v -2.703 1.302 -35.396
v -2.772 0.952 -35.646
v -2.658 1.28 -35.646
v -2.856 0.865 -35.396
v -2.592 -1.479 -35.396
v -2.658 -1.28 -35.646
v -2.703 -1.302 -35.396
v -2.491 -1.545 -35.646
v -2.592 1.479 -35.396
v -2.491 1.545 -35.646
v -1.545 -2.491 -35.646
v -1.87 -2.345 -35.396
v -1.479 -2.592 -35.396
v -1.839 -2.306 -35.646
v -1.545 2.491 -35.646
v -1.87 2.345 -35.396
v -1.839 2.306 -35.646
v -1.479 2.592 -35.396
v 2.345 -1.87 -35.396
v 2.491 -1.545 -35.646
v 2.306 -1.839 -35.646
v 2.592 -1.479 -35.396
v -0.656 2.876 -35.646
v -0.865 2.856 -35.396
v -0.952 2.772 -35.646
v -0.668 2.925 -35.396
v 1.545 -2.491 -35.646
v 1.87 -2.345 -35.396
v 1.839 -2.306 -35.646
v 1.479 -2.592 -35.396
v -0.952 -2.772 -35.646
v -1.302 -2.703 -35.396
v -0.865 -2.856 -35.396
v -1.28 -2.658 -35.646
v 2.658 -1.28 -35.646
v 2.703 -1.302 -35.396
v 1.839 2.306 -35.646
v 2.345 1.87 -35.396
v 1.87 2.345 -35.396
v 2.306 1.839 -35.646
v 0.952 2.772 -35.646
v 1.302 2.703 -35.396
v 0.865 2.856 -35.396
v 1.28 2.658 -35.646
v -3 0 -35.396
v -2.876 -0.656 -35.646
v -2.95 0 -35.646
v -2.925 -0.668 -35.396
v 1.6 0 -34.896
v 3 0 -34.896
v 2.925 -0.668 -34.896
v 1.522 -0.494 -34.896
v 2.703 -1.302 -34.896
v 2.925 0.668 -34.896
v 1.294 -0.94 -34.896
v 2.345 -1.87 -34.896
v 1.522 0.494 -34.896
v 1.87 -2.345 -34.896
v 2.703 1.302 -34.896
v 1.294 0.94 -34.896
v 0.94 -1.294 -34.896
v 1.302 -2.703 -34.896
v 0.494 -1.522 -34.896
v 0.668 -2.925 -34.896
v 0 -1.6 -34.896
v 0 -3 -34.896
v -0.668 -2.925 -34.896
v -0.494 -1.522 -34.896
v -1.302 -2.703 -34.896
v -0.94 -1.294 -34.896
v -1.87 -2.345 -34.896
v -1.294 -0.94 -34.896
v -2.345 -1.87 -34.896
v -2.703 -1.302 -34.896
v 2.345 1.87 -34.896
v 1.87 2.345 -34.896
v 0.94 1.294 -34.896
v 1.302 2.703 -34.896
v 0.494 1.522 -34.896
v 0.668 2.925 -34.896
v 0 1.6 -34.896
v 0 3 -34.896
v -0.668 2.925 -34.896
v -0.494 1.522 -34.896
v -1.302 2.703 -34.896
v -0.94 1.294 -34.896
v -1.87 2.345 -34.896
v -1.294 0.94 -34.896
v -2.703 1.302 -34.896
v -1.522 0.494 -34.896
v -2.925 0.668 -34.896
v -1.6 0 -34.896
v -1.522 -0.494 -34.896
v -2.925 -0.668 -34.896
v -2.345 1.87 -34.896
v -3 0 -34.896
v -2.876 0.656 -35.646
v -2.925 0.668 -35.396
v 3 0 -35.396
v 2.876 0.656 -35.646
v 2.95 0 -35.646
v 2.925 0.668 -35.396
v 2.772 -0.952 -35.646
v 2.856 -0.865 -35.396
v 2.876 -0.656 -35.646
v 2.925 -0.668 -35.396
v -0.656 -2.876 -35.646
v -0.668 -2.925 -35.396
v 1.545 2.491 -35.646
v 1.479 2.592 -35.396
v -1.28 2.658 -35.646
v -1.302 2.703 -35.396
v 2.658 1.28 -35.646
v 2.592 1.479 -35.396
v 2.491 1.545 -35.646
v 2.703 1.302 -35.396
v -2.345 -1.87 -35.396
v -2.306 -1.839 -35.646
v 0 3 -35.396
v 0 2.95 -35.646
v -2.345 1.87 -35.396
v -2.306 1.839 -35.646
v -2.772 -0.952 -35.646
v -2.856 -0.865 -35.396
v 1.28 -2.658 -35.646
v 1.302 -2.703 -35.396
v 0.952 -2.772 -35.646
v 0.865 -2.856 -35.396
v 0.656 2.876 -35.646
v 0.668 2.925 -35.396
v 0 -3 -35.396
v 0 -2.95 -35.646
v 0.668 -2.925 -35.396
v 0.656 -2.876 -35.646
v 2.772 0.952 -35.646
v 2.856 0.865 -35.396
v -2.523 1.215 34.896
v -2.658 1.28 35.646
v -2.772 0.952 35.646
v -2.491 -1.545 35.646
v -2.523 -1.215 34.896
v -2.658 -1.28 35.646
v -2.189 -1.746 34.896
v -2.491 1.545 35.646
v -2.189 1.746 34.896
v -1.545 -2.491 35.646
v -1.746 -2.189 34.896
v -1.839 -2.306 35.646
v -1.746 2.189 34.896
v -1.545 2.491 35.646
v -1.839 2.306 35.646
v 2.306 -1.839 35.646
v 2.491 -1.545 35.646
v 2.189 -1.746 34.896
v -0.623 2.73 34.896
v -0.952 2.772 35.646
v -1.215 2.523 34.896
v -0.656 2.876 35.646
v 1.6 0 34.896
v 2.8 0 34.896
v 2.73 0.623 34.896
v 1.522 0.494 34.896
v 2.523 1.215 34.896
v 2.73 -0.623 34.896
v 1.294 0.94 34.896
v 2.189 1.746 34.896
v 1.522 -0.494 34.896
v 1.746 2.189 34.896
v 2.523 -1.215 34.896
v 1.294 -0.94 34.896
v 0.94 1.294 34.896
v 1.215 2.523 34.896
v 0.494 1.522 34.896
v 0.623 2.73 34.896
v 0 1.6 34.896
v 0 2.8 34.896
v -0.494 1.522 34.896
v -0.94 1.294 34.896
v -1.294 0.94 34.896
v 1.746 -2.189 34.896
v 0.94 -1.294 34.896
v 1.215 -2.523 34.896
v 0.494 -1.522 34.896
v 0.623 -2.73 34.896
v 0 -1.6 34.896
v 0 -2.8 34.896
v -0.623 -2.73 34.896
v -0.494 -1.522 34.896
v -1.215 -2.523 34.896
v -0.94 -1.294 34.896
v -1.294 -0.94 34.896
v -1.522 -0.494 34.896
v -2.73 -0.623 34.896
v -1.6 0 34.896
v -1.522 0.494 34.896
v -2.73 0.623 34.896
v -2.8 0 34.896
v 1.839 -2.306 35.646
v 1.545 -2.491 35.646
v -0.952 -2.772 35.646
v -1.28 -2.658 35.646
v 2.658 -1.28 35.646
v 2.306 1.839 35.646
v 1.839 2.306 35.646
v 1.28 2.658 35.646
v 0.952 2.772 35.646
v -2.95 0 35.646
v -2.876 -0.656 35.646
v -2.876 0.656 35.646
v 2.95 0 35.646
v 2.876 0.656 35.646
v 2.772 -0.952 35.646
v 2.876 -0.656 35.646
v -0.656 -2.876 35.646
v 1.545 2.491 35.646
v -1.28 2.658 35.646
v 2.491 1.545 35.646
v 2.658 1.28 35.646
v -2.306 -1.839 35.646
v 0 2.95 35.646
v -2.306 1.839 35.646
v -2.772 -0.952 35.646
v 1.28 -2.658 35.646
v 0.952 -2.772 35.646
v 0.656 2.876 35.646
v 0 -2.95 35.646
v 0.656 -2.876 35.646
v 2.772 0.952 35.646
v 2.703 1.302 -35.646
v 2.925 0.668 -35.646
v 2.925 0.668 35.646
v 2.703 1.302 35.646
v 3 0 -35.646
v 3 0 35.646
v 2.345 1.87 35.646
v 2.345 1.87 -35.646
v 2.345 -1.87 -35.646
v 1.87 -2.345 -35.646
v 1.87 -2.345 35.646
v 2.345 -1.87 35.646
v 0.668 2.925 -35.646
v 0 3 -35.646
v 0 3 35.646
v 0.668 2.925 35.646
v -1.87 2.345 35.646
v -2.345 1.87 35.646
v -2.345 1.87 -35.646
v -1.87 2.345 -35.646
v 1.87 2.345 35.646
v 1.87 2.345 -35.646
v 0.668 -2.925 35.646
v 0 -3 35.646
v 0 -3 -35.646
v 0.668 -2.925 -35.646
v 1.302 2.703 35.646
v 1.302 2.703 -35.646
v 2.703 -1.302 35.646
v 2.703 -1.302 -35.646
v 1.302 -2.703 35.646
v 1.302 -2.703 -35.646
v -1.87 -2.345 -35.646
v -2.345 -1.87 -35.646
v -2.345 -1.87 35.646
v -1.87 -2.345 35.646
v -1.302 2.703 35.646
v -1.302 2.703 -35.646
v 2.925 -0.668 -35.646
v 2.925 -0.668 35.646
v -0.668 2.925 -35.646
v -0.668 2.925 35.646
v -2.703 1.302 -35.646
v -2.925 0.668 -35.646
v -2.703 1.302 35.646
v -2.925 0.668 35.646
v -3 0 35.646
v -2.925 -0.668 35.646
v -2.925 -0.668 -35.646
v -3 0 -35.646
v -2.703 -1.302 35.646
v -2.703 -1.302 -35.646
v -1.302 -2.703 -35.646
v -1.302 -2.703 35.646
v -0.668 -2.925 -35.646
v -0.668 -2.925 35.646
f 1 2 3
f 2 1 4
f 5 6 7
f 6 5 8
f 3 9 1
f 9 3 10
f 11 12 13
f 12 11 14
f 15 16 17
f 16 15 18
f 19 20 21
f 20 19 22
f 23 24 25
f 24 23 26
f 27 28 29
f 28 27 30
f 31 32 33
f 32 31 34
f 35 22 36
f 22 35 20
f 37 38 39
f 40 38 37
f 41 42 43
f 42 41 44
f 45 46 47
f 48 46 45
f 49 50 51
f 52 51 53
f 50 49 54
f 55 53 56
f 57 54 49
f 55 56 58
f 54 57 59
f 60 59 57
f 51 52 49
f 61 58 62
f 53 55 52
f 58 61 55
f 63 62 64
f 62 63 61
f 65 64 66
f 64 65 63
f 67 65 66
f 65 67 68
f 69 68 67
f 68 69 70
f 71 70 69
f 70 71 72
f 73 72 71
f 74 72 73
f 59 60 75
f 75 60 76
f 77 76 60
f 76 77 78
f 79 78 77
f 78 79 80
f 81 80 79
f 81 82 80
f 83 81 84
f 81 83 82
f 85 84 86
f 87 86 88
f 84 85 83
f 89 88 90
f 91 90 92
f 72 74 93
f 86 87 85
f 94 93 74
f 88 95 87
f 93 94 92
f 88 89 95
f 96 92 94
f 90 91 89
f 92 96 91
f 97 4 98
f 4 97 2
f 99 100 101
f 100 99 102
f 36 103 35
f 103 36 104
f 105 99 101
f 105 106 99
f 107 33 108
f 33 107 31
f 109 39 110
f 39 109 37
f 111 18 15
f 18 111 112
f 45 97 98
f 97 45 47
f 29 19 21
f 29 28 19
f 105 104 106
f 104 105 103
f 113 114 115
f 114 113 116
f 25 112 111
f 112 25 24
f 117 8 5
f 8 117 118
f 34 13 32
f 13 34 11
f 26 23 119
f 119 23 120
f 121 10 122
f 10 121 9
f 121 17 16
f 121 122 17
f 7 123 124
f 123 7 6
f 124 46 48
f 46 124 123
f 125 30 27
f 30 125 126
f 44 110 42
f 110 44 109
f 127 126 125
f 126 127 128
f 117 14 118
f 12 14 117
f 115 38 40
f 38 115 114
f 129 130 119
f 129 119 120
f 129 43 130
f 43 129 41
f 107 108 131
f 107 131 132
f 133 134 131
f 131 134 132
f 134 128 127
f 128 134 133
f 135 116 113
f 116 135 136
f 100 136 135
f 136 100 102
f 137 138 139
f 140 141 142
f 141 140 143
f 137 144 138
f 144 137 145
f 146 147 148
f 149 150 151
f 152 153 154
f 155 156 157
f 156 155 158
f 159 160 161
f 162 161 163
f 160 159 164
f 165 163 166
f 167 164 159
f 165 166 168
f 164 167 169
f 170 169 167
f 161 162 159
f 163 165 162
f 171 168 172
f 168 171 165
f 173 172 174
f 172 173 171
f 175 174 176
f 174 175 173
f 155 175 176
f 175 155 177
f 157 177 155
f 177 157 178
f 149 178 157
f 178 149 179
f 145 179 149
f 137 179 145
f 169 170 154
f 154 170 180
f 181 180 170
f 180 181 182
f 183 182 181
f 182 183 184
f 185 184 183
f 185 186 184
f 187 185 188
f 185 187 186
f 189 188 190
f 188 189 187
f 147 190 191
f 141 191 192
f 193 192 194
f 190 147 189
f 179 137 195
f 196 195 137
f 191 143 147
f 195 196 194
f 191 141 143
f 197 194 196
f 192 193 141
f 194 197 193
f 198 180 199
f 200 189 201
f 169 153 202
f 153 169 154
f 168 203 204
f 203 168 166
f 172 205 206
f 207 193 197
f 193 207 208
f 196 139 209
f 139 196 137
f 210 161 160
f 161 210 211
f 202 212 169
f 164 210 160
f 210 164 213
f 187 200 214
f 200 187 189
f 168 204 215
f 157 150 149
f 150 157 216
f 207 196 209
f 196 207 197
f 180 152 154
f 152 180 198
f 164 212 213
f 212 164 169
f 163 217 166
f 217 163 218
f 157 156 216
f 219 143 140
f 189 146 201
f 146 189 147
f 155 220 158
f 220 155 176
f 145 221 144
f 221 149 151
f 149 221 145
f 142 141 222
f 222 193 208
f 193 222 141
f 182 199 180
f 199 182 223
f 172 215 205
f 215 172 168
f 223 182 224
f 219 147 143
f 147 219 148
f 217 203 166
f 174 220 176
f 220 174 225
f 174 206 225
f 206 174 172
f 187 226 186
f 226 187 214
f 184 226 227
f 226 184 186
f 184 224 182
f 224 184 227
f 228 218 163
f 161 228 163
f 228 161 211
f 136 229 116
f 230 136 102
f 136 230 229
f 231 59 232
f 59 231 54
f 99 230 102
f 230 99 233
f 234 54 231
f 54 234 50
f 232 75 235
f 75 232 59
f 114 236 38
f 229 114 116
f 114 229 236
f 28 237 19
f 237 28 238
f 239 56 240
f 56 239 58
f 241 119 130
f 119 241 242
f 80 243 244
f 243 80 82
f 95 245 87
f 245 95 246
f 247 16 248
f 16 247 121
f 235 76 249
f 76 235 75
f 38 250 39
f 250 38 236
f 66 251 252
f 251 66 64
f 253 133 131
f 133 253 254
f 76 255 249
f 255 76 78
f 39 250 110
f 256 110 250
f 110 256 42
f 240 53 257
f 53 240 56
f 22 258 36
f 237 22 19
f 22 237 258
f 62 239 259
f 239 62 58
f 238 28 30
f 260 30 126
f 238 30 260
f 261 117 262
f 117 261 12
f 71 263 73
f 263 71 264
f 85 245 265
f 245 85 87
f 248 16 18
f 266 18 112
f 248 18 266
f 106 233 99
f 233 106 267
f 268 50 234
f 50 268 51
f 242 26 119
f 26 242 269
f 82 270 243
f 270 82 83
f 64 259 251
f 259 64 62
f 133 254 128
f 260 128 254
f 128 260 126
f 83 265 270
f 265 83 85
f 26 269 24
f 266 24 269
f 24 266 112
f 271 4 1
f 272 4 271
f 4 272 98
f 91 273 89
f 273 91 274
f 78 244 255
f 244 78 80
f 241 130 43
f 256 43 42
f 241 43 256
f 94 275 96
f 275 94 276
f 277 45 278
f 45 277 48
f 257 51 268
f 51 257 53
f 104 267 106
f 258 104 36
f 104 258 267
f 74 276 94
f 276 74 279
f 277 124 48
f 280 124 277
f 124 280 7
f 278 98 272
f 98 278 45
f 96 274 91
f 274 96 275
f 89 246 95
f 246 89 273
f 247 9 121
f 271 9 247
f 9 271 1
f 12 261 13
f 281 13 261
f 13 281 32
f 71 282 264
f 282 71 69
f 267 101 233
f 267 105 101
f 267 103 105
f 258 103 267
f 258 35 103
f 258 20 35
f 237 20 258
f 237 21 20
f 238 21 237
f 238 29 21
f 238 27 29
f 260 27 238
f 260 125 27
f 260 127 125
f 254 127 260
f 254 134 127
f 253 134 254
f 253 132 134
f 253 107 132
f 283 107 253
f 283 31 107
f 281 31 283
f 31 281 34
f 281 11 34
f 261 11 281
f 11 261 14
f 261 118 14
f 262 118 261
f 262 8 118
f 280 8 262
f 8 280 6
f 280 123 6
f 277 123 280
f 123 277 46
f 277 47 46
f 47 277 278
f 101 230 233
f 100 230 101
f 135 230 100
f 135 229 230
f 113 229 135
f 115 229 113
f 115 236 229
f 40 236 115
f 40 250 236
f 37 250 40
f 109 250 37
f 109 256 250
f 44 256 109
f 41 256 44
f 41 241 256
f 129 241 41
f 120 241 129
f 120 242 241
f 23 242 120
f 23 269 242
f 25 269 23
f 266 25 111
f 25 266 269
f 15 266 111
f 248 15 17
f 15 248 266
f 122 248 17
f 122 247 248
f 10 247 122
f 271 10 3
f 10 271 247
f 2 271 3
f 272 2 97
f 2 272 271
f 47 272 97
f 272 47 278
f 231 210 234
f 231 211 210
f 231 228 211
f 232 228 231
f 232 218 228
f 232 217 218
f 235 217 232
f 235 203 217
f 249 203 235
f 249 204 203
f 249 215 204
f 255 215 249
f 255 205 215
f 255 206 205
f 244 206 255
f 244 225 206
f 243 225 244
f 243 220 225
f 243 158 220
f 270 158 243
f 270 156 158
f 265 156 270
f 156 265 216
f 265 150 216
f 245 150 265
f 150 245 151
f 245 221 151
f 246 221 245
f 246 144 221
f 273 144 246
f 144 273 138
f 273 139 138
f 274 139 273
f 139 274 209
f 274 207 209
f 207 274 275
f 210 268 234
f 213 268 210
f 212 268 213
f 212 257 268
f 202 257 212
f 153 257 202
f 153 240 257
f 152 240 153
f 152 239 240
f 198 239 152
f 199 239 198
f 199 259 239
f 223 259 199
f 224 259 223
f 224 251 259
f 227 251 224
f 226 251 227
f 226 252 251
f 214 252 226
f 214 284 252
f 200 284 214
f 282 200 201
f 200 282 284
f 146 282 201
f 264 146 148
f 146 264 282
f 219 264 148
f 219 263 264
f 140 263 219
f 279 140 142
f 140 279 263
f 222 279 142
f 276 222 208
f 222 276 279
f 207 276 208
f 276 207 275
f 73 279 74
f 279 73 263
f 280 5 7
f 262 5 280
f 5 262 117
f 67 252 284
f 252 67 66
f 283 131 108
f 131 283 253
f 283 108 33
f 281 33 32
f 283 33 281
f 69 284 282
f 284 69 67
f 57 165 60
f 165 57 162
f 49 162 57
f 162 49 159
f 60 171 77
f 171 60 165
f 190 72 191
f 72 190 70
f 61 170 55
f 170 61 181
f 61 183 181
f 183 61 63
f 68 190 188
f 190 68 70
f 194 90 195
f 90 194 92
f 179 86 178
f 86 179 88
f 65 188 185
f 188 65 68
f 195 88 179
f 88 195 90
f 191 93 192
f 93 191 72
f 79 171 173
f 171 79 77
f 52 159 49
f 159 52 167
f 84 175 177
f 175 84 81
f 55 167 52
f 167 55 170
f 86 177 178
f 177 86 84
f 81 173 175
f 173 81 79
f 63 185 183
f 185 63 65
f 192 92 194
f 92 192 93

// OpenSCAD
// file: params.scad
// Glorb — shared parameters (include from other files)
// Units: millimeters
// Design OD ~12 in → R = 152.4 mm to outer diffuser face

RADIUS_MM = 152.4;

// Strut chords at RADIUS_MM (from mesh/edge_lengths.csv)
STRUT_SHORT = 83.292;
STRUT_LONG  = 94.188;

// Frame (no hub nodes) — faceplate rabbet
FACEPLATE_T = 1.0;       // flush pocket depth
RIM = 2.0;               // outer rim outside faceplate
LEDGE = 1.5;             // support under faceplate
STRUT_DEPTH = 8.0;       // frame thickness inward

// Hub / strut interface (legacy OpenSCAD struts — superseded by Frame_Channels)
STRUT_OD = 6.0;
STRUT_ID = 3.2;
HUB_SOCKET_DEPTH = 6.0;
HUB_BALL = 14.0;

// Light cup (optional alternate architecture)
CUP_WALL = 1.8;
CUP_DEPTH = 10.0;
CUP_FLOOR = 1.6;
LED_BORE = 5.2;
LED_WIRE_SLOT = 2.5;

// Diffuser / faceplate
DIFFUSER_T = FACEPLATE_T;
DIFFUSER_LIP = 0.4;

// Column / base / sphere sleeve
COLUMN_OD_IN = 22.0;     // section inside sphere (above ridge)
COLUMN_OD_BASE = 28.0;   // wider below ridge (mount stop)
COLUMN_ID = 16.0;
COLUMN_INTO_SPHERE = 50.8;  // 2.00 in
COLUMN_BELOW_RIDGE = 100.0;
SLEEVE_ID = 22.4;        // slip on COLUMN_OD_IN
SLEEVE_OD = 32.0;
SLEEVE_LEN = 40.0;
SLEEVE_FLANGE_OD = 36.0;
SLEEVE_FLANGE_T = 3.0;
BASE_D = 170.0;              // top outer OD (skirt); pack+DevKit+buck+stays+lip
BASE_FLOOR_T = 2.0;          // min floor thickness
BASE_SHELL_T = 5.0;          // lid thickness (column socket sits on this)
BASE_CLEAR_H = 44.45;        // 1.75 in interior clearance (battery-safe)
BASE_WALL_T = 5.0;           // BaseTop skirt wall
BASE_LIP_T = 2.5;            // BaseTub short register wall
BASE_LIP_H = 10.0;           // lip height top skirt slides over
BASE_SLIP = 0.4;             // diametral clearance top-ID vs lip-OD
BASE_H = BASE_FLOOR_T + BASE_CLEAR_H + BASE_SHELL_T;  // 51.45 mm overall
BASE_ID = BASE_D - 2 * BASE_WALL_T;  // top skirt ID (~160 mm)
BASE_LIP_OD = BASE_ID - BASE_SLIP;
BASE_BAY_ID = BASE_LIP_OD - 2 * BASE_LIP_T;  // clear inside tub lip

// Bay envelopes (mm) — leave air around; confirm on arrival
BATT_XYZ = [72, 57, 39];           // NYI 12V 6000mAh (2.83x2.26x1.52 in)
BATT_URL = "https://www.amazon.com/dp/B0FDVGB87N";
BATT_OUT_A = 3.0;                  // max continuous output (A)
// Charge with included 12.6V/2A supply only (not a plain 12V adapter)
BUCK_XYZ = [17.5, 12.3, 4.3];      // MP1584EN fixed 5V mini (Amazon B0B779ZYN1)
BUCK_URL = "https://www.amazon.com/dp/B0B779ZYN1";
// Common ESP32-WROOM DevKit (30-pin DOIT/clone ~51.5x28; DevKitC ~55x28 w/ antenna)
// Keep-out includes USB overhang + header height
ESP32_XYZ = [55, 30, 15];
ESP32_NOTE = "ESP32-WROOM DevKit class (home stock)";
JACK_HOLE_D = 12.0;                // panel barrel jack (charger / 12V in)
JACK_CENTER_Z = BASE_FLOOR_T + 20; // above lip — skirt opens into bay
// Base orientation: −Y = front (power switch), +Y = back (DC jack)

// DaierTek KCD1-5-101 round rocker (Amazon B07S1MV462) — snap-in Ø20 mm
SW_HOLE_D = 20.2;                  // print clearance on 20 mm mounting hole
SW_CBORE_D = 24.0;                 // underside counterbore (snap land)
SW_PANEL_T = 2.0;                  // remaining lid thickness at switch
SW_POS = [0, -50];                 // mm on BaseTop lid — front (−Y)
SW_URL = "https://www.amazon.com/dp/B07S1MV462";

// legacy alias
COLUMN_OD = COLUMN_OD_IN;
COLUMN_LEN = COLUMN_INTO_SPHERE + COLUMN_BELOW_RIDGE;
// main file
// Glorb — edge strut
// Set STRUT_LEN to short or long chord, minus 2*HUB_SOCKET_DEPTH for print length.

include <params.scad>

STRUT_TYPE = "short"; // "short" or "long"
CHORD = STRUT_TYPE == "short" ? STRUT_SHORT : STRUT_LONG;
PRINT_LEN = CHORD - 2 * HUB_SOCKET_DEPTH;

module strut() {
    difference() {
        cylinder(d=STRUT_OD, h=PRINT_LEN, $fn=28, center=true);
        cylinder(d=STRUT_ID, h=PRINT_LEN + 1, $fn=20, center=true);
        // slight taper cues at ends for hub entry
        for (s = [-1, 1])
            translate([0, 0, s * PRINT_LEN/2])
                cylinder(d1=STRUT_OD - 0.4, d2=STRUT_OD + 0.2, h=1.5, center=true, $fn=28);
    }
}

echo(str("strut type=", STRUT_TYPE, " print_len_mm=", PRINT_LEN));
strut();
